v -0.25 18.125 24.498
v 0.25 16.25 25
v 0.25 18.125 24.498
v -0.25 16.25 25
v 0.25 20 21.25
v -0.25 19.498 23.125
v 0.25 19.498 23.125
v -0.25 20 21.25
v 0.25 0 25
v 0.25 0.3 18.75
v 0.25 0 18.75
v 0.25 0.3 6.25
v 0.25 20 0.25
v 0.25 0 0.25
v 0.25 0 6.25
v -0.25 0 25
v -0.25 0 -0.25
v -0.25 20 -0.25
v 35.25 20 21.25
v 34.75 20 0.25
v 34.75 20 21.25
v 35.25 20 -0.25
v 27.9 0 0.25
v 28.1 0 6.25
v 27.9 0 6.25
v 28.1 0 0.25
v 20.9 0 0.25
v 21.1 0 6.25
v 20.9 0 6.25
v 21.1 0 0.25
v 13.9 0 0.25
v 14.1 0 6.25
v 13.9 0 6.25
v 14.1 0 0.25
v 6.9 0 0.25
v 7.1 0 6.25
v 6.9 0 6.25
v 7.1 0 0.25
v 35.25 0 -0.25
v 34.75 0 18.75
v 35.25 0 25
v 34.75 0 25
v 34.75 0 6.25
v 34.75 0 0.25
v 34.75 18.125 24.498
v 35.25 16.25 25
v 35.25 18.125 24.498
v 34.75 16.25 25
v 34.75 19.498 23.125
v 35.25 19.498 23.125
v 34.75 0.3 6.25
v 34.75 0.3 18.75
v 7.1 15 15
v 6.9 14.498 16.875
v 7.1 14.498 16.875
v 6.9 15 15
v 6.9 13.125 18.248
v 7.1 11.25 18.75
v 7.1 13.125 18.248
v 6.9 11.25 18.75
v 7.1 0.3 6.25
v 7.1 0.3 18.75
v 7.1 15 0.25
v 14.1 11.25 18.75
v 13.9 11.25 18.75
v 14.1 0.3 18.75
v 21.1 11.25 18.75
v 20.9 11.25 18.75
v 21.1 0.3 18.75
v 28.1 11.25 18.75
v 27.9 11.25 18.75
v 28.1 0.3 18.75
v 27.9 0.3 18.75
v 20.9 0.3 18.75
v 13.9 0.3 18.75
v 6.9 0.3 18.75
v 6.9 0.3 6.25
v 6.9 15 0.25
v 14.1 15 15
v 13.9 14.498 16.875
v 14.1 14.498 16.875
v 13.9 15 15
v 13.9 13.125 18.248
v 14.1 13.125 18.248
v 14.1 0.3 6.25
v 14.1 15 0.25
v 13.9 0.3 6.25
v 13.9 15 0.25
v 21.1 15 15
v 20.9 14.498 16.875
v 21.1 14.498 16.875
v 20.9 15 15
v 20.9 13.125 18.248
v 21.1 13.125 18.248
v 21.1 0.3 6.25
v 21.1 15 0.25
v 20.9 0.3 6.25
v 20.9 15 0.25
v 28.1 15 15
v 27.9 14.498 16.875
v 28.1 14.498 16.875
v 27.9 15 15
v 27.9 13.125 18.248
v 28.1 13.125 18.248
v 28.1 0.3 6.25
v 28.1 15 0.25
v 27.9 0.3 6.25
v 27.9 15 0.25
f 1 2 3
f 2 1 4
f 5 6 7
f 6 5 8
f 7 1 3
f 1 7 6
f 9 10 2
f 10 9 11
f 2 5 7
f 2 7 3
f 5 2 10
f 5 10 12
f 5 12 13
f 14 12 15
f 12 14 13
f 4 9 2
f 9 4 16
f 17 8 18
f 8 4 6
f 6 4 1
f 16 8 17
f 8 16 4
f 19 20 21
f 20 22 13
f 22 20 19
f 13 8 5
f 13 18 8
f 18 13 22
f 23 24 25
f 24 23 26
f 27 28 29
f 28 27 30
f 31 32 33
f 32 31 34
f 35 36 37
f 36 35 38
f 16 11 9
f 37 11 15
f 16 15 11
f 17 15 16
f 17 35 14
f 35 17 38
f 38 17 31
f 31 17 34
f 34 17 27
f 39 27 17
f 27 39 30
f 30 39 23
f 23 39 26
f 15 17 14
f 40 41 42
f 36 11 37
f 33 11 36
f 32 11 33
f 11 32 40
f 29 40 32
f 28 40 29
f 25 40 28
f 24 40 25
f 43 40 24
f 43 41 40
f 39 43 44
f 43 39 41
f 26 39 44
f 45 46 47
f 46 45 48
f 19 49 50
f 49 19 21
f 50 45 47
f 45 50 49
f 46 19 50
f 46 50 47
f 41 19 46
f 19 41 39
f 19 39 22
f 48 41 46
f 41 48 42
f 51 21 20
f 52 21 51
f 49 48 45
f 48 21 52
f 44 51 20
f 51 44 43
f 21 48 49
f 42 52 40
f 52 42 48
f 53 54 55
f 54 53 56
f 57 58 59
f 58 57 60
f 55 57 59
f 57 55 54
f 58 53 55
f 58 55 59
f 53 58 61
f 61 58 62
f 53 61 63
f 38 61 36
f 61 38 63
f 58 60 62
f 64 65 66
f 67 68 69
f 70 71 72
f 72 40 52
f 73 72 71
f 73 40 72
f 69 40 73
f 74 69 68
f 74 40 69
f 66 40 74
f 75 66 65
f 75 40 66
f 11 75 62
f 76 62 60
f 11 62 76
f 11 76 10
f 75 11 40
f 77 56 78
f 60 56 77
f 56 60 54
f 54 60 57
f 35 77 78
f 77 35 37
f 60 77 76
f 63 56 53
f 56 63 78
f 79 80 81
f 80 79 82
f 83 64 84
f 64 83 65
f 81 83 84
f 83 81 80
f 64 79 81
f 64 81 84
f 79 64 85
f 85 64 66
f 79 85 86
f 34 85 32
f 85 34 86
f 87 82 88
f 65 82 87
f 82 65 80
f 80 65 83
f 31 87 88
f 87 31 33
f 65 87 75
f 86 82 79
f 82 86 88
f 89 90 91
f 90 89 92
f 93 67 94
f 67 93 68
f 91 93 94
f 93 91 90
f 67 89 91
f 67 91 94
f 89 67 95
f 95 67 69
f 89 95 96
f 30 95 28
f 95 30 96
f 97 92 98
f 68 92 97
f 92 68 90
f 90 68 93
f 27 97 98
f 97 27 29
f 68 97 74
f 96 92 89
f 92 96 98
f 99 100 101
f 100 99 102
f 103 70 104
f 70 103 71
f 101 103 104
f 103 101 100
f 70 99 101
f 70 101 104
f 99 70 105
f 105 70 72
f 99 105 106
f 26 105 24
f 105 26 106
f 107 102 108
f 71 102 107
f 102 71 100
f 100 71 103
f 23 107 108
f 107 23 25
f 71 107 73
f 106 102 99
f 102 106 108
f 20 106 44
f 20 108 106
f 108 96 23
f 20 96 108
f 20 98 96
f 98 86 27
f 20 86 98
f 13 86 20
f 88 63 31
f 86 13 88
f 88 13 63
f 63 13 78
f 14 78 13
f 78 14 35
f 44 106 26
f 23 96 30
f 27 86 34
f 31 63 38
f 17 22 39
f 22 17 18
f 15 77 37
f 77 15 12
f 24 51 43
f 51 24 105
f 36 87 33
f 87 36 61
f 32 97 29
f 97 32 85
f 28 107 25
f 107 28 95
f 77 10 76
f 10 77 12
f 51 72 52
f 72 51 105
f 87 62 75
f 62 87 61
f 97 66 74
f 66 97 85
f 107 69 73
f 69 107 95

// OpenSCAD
width = 35;//[5:100]
height = 25;//[5:40]
depth = 20;//[5:40]
inner_support = 4;//[0:20]
support_size_percent = 75;//[50:100]
fillet_size_percent = 30;//[0:100]

fillet_size = fillet_size_percent/100;
support_size = support_size_percent/100;

make_main_support();
make_supports();

translate([width/2, depth/2, 0])
cube([width+0.5, depth, 0.5], center = true);

translate([0,0,height/4])
cube([width, 0.3, 0.5*height]);

module make_supports(){
    for(a=[1:inner_support]){
        translate([0,depth/2*support_size, height/2*support_size])
        difference(){
            translate([width/(inner_support+1)*a, 0,0])
            cube([0.2, depth*support_size, height*support_size], center = true);
            difference(){
                translate([0,depth/2*support_size, height/2*support_size])
                cube([2*width, height*fillet_size, height*fillet_size], center = true);
                
                translate([0, depth/2*support_size-height*fillet_size/2, height/2*support_size-height*fillet_size/2])
                rotate([0,90,0])
                cylinder(h=2*width, r=height*fillet_size/2, center = true);
            }
        }
    }
}

module make_main_support(){
    difference(){
        for(a=[0:1]){
            translate([a*width,depth/2, height/2])
            difference(){
                cube([0.5, depth, height], center=true);
                difference(){
                    translate([0,depth/2, height/2])
                    cube([2*width, height*fillet_size, height*fillet_size], center = true);
                    
                    translate([0, depth/2-height*fillet_size/2, height/2-height*fillet_size/2])
                    rotate([0,90,0])
                    cylinder(h=2*width, r=height*fillet_size/2, center = true);
                }
            }  
        }
    }
}
